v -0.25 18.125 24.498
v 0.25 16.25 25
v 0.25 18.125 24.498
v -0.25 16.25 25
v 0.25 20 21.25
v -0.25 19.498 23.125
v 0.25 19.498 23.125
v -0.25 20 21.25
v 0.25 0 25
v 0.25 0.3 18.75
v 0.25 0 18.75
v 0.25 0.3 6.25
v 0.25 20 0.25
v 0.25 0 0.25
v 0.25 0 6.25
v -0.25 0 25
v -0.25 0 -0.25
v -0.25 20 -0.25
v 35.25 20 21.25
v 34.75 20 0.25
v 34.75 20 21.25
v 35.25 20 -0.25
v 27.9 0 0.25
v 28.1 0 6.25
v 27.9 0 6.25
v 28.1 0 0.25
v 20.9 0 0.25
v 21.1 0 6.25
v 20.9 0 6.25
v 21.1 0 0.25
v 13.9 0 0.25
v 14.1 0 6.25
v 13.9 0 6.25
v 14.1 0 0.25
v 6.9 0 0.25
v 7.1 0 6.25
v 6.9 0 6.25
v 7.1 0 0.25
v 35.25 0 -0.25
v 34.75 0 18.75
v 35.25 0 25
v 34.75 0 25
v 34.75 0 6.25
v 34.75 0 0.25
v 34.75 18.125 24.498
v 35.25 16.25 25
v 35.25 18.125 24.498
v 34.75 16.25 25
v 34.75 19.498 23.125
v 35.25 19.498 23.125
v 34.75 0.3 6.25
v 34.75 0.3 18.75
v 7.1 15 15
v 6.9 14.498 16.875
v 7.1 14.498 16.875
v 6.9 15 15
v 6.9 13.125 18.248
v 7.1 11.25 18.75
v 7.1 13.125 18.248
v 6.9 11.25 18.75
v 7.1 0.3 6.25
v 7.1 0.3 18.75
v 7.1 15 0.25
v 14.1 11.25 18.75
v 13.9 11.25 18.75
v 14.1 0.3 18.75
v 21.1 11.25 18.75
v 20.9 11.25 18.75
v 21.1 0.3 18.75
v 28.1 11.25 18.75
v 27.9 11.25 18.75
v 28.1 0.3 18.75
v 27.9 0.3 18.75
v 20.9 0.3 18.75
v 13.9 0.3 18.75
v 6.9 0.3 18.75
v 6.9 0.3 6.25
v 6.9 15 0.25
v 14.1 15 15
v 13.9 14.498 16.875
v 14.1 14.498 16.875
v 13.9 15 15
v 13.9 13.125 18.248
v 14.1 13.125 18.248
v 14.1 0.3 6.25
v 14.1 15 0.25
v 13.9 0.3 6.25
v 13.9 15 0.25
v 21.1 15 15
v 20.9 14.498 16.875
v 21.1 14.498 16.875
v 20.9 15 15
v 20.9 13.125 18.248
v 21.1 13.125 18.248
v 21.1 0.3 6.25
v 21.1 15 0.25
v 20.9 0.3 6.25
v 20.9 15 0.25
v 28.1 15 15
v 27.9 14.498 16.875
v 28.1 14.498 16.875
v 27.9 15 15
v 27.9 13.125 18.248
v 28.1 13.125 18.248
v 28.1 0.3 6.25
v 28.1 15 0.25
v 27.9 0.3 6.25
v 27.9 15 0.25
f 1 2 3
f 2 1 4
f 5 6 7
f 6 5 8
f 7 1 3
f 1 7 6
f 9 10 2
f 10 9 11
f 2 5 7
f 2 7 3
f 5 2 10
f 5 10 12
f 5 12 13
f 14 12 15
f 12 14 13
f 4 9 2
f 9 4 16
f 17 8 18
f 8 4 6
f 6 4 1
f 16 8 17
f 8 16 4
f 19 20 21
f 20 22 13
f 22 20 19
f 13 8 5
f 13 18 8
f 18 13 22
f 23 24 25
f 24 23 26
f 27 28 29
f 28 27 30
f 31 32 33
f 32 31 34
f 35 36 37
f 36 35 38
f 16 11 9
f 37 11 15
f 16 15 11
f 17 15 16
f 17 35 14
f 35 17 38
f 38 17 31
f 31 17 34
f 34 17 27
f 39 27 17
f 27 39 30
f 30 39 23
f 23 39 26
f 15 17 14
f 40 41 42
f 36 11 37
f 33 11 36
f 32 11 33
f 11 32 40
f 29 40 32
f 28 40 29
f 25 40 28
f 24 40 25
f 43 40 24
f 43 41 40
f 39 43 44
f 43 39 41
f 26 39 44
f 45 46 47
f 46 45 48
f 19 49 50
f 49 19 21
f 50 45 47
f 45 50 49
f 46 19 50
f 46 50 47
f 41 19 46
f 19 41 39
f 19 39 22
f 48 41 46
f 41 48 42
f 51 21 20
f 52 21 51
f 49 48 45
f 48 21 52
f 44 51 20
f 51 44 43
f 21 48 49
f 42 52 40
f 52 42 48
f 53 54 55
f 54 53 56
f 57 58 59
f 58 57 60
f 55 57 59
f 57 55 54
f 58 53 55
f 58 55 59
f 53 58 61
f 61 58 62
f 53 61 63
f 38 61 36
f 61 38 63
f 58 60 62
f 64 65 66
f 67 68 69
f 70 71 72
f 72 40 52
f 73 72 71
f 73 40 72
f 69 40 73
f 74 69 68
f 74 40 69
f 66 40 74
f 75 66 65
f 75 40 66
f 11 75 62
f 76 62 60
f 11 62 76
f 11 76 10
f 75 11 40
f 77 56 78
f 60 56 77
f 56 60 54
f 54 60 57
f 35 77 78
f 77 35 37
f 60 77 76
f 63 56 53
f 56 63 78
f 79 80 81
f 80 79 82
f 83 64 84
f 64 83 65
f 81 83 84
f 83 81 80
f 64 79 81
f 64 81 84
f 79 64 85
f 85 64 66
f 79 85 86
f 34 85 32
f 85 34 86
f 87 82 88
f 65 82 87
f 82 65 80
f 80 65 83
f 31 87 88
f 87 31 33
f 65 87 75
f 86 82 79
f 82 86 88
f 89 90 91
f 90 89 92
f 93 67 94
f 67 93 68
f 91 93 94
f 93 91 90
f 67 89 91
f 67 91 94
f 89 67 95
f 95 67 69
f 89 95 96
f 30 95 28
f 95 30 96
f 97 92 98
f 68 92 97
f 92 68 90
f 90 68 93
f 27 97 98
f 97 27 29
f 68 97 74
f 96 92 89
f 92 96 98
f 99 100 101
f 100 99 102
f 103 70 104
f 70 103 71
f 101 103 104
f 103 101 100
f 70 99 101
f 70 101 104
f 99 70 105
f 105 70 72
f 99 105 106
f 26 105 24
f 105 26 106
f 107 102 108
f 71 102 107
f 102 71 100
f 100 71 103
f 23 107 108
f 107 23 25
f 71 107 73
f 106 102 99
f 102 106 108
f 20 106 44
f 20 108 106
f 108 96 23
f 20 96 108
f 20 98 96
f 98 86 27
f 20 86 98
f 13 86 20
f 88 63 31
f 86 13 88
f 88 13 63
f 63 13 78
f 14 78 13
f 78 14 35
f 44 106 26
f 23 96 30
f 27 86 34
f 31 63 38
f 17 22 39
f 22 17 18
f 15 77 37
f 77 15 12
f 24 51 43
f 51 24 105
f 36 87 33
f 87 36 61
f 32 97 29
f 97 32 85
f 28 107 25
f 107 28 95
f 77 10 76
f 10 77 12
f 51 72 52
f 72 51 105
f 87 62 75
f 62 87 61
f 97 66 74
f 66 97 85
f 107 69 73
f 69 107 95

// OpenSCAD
width = 35;//[5:100]
height = 25;//[5:40]
depth = 20;//[5:40]
inner_support = 4;//[0:20]
support_size_percent = 75;//[50:100]
fillet_size_percent = 30;//[0:100]

fillet_size = fillet_size_percent/100;
support_size = support_size_percent/100;

make_main_support();
make_supports();

translate([width/2, depth/2, 0])
cube([width+0.5, depth, 0.5], center = true);

translate([0,0,height/4])
cube([width, 0.3, 0.5*height]);

module make_supports(){
    for(a=[1:inner_support]){
        translate([0,depth/2*support_size, height/2*support_size])
        difference(){
            translate([width/(inner_support+1)*a, 0,0])
            cube([0.2, depth*support_size, height*support_size], center = true);
            difference(){
                translate([0,depth/2*support_size, height/2*support_size])
                cube([2*width, height*fillet_size, height*fillet_size], center = true);
                
                translate([0, depth/2*support_size-height*fillet_size/2, height/2*support_size-height*fillet_size/2])
                rotate([0,90,0])
                cylinder(h=2*width, r=height*fillet_size/2, center = true);
            }
        }
    }
}

module make_main_support(){
    difference(){
        for(a=[0:1]){
            translate([a*width,depth/2, height/2])
            difference(){
                cube([0.5, depth, height], center=true);
                difference(){
                    translate([0,depth/2, height/2])
                    cube([2*width, height*fillet_size, height*fillet_size], center = true);
                    
                    translate([0, depth/2-height*fillet_size/2, height/2-height*fillet_size/2])
                    rotate([0,90,0])
                    cylinder(h=2*width, r=height*fillet_size/2, center = true);
                }
            }  
        }
    }
}
